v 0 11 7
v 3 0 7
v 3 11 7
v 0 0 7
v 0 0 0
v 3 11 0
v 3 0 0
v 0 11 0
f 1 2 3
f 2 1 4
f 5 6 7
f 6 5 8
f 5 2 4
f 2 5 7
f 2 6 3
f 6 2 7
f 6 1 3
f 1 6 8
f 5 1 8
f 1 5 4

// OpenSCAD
// Generated by SolidPython 1.0.1 on 2020-07-29 00:46:54


cube(size = [3, 11, 7]);
/***********************************************
*********      SolidPython code:      **********
************************************************
 
# import packages: SolidPython
from solid import *
from solid.utils import *
from itertools import chain, combinations, permutations


class Resize:

    def __init__(self, scad_file):
        self.scad_file = scad_file
        #self.scad_file = import_scad(scad_file)
        # cone/cylinder param:
        self.r1 = 0
        self.r2 = 0
        self.h = 0
        # rectangular prism param:
        self.w = 0
        self.l = 0
        # ellipse param:
        self.r = 0

    # import OpenScad code (file name corresponds to shape)


    # classify shape + parameters
    def assign(self, param1, param2, param3):
        if self.scad_file == 'cone.scad':
            self.r1 = param1
            self.r2 = param2
            self.h = param3
        elif self.scad_file == 'cylinder.scad':
            self.r1 = param1
            self.r2 = param2
            self.h = param3
        elif self.scad_file == 'rectangularPrism.scad':
            self.h = param1
            self.l = param2
            self.w = param3
        else:
            self.r = param1
            self.h = param2

    # resize parameters
    def iterate(self):
        x = range(3, 20, 2)
        i = 1
        if self.scad_file == 'cone.scad':
            tempList = list(permutations(x, 2))
            for temp in tempList:
                param1 = temp[0]
                param2 = temp[1]
                filepath = 'produced_scad_files/' + 'cone' + str(param1) + '_' + str(param2) + '_' + '.scad'
                scad_render_to_file(cylinder(h=param1, r1=param2, r2=0), filepath)

        elif self.scad_file == 'cylinder.scad':
            tempList = list(permutations(x, 3))
            for temp in tempList:
                param1 = temp[0]
                param2 = temp[1]
                filepath = 'produced_scad_files/' + 'cylinder' + str(param1) + '_' + str(param2) + '_' + '.scad'
                scad_render_to_file(cylinder(h=param1, r1=param2, r2=param2), filepath)

        elif self.scad_file == 'rectangularPrism.scad':
            tempList = list(permutations(x, 3))
            for temp in tempList:
                param1 = temp[0]
                param2 = temp[1]
                param3 = temp[2]
                filepath = 'produced_scad_files/' + 'rectangularPrism' + str(param1) + '_' + str(param2) + '_' + str(
                    param3) + '.scad'
                scad_render_to_file(cube(size=(param1, param2, param3)), filepath)

        elif self.scad_file == 'ellipse.scad':
            tempList = list(permutations(x, 4))
            for temp in tempList:
                param1 = temp[0]
                param2 = temp[1]
                param3 = temp[2]
                param4 = temp[3]
                filepath = 'produced_scad_files/' + 'ellipse' + str(param1) + '_' + str(param2) + '_' + str(param3) + '_' + str(param4) + '.scad'
                scad_render_to_file(scale([param1, param2, param3])(sphere(r=param4)), filepath)

    def render_to_scadfile(self):
        scad_render_to_file(scad, 'example.scad') 
 
************************************************/
